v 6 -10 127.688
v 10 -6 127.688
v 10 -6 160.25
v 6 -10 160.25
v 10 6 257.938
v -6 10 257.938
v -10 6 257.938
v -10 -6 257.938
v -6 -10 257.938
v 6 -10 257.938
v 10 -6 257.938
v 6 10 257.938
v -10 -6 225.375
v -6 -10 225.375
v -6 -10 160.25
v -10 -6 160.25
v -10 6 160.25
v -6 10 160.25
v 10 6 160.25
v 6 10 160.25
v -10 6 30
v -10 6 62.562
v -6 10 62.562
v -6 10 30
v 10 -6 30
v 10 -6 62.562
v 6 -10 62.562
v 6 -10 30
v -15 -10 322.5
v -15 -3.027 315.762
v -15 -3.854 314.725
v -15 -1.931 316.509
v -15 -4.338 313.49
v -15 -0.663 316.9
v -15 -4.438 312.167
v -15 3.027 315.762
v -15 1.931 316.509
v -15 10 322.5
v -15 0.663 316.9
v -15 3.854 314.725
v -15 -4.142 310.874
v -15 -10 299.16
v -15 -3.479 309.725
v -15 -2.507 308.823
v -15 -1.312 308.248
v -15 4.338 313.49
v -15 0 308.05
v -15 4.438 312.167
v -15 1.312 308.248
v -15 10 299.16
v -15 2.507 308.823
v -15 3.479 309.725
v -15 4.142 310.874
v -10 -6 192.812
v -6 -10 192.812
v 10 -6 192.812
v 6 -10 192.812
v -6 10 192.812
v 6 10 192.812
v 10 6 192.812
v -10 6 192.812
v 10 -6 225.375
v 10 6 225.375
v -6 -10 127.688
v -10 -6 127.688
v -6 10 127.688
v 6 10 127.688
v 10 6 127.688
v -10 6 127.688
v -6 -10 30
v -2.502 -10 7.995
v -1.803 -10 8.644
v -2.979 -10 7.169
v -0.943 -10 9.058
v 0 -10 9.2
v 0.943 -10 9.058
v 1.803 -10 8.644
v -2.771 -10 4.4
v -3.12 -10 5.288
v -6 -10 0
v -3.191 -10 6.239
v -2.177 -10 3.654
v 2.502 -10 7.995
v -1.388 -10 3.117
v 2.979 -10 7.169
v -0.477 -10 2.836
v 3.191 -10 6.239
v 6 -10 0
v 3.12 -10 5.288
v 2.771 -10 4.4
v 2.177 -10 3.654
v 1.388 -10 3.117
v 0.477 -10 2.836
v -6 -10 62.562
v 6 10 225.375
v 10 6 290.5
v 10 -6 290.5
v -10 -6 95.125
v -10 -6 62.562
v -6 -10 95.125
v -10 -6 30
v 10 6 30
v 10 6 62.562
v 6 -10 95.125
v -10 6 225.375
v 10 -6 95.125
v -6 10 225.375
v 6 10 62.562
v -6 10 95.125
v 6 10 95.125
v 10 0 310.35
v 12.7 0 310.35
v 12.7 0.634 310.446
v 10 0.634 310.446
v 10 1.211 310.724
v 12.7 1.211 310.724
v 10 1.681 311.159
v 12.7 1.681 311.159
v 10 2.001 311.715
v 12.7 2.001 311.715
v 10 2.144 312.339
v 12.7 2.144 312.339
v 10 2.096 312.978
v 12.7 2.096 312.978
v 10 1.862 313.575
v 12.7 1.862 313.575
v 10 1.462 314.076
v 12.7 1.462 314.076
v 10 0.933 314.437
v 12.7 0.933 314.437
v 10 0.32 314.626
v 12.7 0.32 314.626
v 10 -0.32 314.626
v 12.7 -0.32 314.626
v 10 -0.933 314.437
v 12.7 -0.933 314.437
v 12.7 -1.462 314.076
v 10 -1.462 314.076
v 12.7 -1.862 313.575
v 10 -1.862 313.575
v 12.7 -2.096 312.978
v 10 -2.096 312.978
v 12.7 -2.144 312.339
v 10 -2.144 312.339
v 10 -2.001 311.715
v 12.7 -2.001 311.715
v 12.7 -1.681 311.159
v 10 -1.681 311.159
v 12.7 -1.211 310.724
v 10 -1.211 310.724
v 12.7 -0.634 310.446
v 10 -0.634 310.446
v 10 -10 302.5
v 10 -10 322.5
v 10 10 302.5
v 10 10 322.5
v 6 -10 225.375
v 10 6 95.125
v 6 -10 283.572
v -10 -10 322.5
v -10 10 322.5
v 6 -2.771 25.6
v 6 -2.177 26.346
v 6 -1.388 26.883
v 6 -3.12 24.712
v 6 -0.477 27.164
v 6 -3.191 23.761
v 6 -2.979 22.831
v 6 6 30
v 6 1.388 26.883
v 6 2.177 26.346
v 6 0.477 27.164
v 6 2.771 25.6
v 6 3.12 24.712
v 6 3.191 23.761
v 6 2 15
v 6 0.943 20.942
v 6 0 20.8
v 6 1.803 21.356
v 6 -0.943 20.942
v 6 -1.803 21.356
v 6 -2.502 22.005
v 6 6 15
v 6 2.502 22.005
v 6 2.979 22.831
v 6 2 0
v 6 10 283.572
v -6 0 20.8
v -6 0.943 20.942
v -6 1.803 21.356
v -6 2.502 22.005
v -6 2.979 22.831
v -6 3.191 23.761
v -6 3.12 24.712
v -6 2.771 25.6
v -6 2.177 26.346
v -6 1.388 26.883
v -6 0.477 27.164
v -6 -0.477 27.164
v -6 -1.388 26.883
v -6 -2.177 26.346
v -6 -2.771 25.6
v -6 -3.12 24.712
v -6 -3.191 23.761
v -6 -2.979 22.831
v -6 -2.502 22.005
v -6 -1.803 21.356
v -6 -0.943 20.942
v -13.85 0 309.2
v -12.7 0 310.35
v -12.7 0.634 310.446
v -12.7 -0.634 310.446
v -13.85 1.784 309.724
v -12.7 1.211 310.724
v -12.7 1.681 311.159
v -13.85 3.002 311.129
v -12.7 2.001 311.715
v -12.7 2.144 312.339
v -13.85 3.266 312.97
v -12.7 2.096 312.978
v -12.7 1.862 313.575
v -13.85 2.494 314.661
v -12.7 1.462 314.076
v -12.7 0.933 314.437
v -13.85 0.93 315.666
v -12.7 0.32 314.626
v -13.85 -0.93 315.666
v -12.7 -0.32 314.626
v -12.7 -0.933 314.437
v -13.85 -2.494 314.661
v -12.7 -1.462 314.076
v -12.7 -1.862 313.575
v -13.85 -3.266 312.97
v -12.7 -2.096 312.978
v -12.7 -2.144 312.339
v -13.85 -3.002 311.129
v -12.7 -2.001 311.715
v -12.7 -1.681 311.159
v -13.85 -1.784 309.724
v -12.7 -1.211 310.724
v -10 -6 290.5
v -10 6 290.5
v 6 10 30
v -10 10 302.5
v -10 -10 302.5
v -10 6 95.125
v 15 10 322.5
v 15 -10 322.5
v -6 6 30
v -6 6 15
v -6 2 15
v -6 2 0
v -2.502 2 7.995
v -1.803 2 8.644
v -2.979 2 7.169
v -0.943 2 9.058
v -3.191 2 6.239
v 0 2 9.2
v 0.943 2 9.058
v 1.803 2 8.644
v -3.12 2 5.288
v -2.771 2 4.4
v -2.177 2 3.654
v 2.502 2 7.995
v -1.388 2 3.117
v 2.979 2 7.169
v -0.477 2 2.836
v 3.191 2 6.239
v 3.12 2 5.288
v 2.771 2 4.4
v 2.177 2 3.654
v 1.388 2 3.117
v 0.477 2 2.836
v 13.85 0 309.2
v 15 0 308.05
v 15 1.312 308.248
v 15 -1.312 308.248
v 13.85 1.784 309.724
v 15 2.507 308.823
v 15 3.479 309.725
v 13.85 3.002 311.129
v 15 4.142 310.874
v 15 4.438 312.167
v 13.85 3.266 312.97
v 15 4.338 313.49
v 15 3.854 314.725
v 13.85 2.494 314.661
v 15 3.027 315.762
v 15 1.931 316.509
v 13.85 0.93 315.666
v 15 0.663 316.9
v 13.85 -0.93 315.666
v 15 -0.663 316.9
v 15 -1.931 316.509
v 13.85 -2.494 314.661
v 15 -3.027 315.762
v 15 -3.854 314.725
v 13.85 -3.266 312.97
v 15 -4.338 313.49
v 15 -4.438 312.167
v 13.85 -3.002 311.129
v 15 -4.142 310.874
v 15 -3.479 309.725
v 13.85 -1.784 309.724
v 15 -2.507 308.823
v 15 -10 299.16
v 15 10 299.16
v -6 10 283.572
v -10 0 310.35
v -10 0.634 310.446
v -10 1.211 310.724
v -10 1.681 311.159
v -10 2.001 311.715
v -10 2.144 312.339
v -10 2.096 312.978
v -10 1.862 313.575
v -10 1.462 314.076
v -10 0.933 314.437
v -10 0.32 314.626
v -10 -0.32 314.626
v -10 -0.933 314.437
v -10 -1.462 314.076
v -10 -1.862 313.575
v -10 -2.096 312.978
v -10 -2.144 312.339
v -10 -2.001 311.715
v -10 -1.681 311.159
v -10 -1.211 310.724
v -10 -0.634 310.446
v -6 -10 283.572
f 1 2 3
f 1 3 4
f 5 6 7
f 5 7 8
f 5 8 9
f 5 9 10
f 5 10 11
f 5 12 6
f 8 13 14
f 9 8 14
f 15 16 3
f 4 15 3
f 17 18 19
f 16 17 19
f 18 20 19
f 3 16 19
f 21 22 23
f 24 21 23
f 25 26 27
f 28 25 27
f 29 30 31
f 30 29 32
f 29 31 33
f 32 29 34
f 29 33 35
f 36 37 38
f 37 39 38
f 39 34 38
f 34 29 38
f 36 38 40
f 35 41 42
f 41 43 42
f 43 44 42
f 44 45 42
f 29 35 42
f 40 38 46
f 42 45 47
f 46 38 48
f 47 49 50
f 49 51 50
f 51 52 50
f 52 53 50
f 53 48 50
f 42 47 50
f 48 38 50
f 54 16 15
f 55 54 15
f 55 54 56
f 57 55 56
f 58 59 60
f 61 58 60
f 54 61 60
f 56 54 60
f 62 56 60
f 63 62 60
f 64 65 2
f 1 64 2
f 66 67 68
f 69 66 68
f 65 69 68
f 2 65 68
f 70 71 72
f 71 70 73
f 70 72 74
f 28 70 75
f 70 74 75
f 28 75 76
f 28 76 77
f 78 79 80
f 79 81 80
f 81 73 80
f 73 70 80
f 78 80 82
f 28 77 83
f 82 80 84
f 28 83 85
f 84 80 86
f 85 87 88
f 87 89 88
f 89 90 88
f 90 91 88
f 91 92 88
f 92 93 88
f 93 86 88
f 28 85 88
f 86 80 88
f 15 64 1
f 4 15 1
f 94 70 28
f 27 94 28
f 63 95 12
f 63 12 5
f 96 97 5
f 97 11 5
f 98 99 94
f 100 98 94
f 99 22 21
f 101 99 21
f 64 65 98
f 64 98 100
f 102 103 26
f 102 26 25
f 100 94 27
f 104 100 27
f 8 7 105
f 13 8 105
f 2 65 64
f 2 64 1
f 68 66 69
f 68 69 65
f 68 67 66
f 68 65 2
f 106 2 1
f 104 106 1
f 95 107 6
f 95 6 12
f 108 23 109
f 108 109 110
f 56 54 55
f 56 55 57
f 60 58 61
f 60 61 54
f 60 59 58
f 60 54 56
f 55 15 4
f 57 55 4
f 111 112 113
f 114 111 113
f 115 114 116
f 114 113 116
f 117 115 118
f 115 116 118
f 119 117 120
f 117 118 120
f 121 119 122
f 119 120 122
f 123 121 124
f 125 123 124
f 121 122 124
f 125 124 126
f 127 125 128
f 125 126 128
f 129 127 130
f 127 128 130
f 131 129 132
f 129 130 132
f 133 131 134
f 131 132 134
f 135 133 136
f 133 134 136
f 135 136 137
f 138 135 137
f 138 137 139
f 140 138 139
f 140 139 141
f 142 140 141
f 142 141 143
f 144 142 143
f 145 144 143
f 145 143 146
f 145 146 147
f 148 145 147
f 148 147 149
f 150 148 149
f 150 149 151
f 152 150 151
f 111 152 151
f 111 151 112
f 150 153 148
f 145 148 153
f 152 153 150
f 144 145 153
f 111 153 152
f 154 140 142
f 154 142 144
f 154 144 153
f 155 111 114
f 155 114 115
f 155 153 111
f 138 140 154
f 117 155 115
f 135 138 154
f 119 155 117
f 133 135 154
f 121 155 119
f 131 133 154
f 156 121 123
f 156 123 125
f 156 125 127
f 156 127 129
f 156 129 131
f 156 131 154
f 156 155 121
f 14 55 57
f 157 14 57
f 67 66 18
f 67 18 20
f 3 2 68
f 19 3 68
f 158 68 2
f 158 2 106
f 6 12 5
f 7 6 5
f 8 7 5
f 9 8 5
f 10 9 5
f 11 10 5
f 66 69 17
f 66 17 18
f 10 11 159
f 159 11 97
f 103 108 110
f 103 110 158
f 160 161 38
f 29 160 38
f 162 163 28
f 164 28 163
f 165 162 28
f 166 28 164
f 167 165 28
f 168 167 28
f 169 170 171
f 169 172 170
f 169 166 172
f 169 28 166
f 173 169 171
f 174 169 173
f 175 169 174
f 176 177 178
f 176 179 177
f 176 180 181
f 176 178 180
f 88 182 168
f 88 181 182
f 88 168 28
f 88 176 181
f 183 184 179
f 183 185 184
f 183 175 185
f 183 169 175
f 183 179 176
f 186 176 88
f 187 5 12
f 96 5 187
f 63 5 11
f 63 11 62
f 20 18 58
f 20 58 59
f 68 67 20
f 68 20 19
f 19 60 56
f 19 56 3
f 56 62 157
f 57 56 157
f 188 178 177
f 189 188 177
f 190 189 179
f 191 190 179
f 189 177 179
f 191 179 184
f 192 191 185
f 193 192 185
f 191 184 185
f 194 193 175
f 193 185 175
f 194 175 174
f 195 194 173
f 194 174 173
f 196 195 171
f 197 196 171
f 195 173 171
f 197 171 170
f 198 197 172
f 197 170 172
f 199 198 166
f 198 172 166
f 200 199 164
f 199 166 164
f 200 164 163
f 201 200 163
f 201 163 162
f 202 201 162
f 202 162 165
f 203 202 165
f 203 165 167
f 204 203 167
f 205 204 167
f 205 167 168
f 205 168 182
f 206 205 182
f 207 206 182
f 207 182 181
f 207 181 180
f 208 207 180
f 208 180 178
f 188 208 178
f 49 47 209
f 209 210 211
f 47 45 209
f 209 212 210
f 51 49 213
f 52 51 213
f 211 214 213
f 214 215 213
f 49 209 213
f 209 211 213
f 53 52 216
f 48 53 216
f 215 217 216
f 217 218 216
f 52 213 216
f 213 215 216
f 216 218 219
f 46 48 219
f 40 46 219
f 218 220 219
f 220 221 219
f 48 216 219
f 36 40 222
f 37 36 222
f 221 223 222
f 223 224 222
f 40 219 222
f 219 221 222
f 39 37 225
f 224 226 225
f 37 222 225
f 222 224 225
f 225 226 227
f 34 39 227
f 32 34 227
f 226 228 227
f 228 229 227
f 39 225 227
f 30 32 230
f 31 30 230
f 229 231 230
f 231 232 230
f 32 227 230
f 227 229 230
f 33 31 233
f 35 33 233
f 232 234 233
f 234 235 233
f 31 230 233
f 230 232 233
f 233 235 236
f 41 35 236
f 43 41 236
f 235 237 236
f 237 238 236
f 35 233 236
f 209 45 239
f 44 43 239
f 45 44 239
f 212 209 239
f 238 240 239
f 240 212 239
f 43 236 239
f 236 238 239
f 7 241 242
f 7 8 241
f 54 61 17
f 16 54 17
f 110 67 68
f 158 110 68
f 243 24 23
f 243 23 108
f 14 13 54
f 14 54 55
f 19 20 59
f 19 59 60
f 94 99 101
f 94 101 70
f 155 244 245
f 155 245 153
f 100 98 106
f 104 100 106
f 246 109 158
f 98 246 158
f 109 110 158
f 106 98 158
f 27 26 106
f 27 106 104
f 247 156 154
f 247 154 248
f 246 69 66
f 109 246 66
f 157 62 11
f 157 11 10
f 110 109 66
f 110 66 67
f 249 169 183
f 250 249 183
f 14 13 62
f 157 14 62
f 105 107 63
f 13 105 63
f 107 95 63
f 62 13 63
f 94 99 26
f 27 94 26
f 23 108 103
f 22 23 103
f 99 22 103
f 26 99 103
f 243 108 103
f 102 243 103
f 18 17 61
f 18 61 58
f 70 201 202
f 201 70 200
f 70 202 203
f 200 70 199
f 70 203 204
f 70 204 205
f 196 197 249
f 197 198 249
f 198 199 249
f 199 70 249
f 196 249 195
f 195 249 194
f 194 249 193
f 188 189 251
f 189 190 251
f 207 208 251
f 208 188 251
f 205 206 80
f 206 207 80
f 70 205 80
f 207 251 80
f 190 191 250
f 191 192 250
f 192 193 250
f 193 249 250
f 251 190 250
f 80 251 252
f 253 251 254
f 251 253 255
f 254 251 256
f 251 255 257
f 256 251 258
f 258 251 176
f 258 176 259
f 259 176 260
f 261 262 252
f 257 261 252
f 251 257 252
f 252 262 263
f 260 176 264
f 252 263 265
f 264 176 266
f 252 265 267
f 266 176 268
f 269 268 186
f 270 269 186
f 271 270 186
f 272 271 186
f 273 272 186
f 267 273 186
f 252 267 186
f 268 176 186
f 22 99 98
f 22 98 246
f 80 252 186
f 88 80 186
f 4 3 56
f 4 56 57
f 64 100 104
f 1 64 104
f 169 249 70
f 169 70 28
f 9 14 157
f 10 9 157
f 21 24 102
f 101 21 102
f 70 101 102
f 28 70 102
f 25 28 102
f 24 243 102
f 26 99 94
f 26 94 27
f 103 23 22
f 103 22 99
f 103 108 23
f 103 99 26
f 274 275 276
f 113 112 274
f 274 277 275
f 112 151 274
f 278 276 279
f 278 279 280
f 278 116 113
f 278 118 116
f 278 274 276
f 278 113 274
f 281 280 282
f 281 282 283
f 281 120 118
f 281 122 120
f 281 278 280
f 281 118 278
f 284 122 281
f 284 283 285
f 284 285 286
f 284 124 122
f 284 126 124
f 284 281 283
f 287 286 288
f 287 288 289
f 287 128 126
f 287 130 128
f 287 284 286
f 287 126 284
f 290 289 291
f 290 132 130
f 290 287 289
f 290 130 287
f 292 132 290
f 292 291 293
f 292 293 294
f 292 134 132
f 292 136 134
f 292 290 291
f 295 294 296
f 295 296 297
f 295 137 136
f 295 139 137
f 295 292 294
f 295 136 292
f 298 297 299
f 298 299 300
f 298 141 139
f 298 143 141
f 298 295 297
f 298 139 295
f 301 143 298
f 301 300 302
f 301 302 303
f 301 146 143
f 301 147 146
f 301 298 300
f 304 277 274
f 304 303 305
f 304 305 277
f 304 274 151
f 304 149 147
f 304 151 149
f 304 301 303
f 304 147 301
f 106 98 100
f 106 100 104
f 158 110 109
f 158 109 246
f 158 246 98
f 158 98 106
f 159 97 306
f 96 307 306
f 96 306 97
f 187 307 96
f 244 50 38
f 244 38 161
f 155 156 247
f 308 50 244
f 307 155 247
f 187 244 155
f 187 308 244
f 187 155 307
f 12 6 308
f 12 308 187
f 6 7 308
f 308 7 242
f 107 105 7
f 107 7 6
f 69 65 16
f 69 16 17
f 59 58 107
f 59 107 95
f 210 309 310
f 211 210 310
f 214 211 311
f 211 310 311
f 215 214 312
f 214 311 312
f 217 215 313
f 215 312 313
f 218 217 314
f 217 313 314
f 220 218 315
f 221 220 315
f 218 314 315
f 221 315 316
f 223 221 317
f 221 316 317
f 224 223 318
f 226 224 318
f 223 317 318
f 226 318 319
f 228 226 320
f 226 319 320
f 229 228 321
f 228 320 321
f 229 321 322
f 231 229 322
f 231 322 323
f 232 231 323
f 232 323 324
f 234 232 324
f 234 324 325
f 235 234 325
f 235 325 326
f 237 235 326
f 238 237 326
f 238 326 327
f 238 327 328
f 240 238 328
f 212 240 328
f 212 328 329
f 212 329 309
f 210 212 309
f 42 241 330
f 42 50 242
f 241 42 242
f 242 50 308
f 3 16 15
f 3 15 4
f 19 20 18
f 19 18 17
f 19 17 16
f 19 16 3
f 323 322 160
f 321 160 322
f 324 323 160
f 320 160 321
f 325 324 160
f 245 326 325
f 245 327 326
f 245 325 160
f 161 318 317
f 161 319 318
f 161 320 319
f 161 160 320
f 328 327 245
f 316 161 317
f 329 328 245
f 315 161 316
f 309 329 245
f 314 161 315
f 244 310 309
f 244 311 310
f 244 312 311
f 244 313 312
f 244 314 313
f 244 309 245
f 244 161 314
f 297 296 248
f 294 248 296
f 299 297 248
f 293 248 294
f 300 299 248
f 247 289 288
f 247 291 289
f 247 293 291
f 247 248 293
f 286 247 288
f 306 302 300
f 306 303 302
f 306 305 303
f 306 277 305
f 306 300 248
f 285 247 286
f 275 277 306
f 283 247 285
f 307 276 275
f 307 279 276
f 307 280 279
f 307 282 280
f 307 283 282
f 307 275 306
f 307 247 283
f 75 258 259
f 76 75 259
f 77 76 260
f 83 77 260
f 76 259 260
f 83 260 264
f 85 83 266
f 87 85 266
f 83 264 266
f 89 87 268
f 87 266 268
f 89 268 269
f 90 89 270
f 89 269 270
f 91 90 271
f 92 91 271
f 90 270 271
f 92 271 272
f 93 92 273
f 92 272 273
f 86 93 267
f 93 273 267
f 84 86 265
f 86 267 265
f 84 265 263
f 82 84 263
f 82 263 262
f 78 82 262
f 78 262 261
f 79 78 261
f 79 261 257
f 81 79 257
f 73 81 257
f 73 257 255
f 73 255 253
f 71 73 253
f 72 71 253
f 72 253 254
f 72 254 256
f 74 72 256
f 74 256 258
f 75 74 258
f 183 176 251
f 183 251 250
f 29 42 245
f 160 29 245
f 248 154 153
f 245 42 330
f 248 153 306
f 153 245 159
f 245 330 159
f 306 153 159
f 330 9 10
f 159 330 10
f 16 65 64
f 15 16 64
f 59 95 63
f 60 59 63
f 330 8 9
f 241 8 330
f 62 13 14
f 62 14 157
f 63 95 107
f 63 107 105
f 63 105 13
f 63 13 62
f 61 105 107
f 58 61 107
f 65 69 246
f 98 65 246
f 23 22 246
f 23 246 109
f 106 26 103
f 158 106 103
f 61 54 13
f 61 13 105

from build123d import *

# Parameters (mm, degrees)
SKETCH1_W             = 20
SKETCH1_H             = 20
BOSS_EXTRUDE1_DEPTH   = 302.5
BOSS_EXTRUDE2_DEPTH   = 20
SKETCH3_R             = 2.15
CUT_EXTRUDE1_DEPTH    = 325.046678736
SKETCH4_W             = 4
SKETCH4_H             = 30
CUT_EXTRUDE2_DEPTH    = 324.467540875
CHAMFER1_SIZE         = 2.3
SKETCH5_W             = 15
SKETCH5_H             = 8
CUT_EXTRUDE3_DEPTH    = 324.337671792
SKETCH6_R             = 3.2
CUT_EXTRUDE4_DEPTH    = 324.071586494
SKETCH7_R             = 3.2
CUT_EXTRUDE5_DEPTH    = 324.337671792
SKETCH10_W            = 20
SKETCH10_H            = 32.5625
CUT_EXTRUDE7_DEPTH    = 324.467540875
SKETCH11_W            = 20
SKETCH11_H            = 32.5625
BOSS_EXTRUDE3_DEPTH   = 20
BOSS_EXTRUDE3_2_DEPTH = 20
BOSS_EXTRUDE3_3_DEPTH = 20
BOSS_EXTRUDE3_4_DEPTH = 20
CHAMFER3_SIZE         = 4
CUT_EXTRUDE8_DEPTH    = 227.9375
SKETCH13_W            = 15
SKETCH13_H            = 4
CUT_EXTRUDE9_DEPTH    = 324.337671792


with BuildPart() as part:
    # Sketch1 → Boss-Extrude1 (new body)
    with BuildSketch(Plane.XY):
        Rectangle(SKETCH1_W, SKETCH1_H)
    extrude(amount=BOSS_EXTRUDE1_DEPTH)

    # Sketch2 → Boss-Extrude2 (add)
    with BuildSketch(Plane(origin=(0, 10, 0), x_dir=(1, 0, 0), z_dir=(0, 1, 0))):
        Polygon((10, -302.5), (10, -322.5), (15, -322.5), (15, -299.160254038), (10, -290.5), align=None)
        Polygon((-10, -290.5), (-10, -302.5), (-10, -322.5), (-15, -322.5), (-15, -299.160254038), align=None)
    extrude(amount=-BOSS_EXTRUDE2_DEPTH)

    # Sketch3 → Cut-Extrude1 (cut, through all)
    with BuildSketch(Plane(origin=(15, 0, 0), x_dir=(0, 0, -1), z_dir=(1, 0, 0))):
        with Locations((-312.5, 0)):
            Circle(SKETCH3_R)
    extrude(amount=-CUT_EXTRUDE1_DEPTH, mode=Mode.SUBTRACT)

    # Sketch4 → Cut-Extrude2 (cut, through all)
    with BuildSketch(Plane(origin=(0, 10, 0), x_dir=(1, 0, 0), z_dir=(0, 1, 0))):
        with Locations((-8, -15)):
            Rectangle(SKETCH4_W, SKETCH4_H)
        with Locations((8, -15)):
            Rectangle(SKETCH4_W, SKETCH4_H)
    extrude(amount=-CUT_EXTRUDE2_DEPTH, mode=Mode.SUBTRACT)

    # Chamfer1
    chamfer1_edges = [part.edges().sort_by_distance(p)[0] for p in [
        (-15, 0, 314.65),
        (15, 0, 314.65),
    ]]
    chamfer(chamfer1_edges, length=CHAMFER1_SIZE)

    # Sketch5 → Cut-Extrude3 (cut, through all)
    with BuildSketch(Plane(origin=(6, 0, 0), x_dir=(0, 0, -1), z_dir=(1, 0, 0))):
        with Locations((-7.5, 6)):
            Rectangle(SKETCH5_W, SKETCH5_H)
    extrude(amount=-CUT_EXTRUDE3_DEPTH, mode=Mode.SUBTRACT)

    # Sketch6 → Cut-Extrude4 (cut, through all)
    with BuildSketch(Plane(origin=(0, 2, 0), x_dir=(1, 0, 0), z_dir=(0, 1, 0))):
        with Locations(Location((0, -6, 0), (0, 0, 270))):
            Circle(SKETCH6_R)
    extrude(amount=-CUT_EXTRUDE4_DEPTH, mode=Mode.SUBTRACT)

    # Sketch7 → Cut-Extrude5 (cut, through all)
    with BuildSketch(Plane(origin=(6, 0, 0), x_dir=(0, 0, -1), z_dir=(1, 0, 0))):
        with Locations((-24, 0)):
            Circle(SKETCH7_R)
    extrude(amount=-CUT_EXTRUDE5_DEPTH, mode=Mode.SUBTRACT)

    # Sketch10 → Cut-Extrude7 (cut, through all)
    with BuildSketch(Plane(origin=(0, 10, 0), x_dir=(1, 0, 0), z_dir=(0, 1, 0))):
        with Locations((0, -46.28125)):
            Rectangle(SKETCH10_W, SKETCH10_H)
        with Locations((0, -111.40625)):
            Rectangle(SKETCH10_W, SKETCH10_H)
        with Locations((0, -176.53125)):
            Rectangle(SKETCH10_W, SKETCH10_H)
        with Locations((0, -241.65625)):
            Rectangle(SKETCH10_W, SKETCH10_H)
    extrude(amount=-CUT_EXTRUDE7_DEPTH, mode=Mode.SUBTRACT)


with BuildPart() as cut_extrude7_piece_1:
    # of the separate pieces the step leaves, piece 1, a body of its own (cut_extrude7_pieces)
    add(part.part.solids().sort_by_distance((15, 0, 308.05))[0])

    # Chamfer3
    chamfer3_edges = [cut_extrude7_piece_1.edges().sort_by_distance(p)[0] for p in [
        (10, 10, 274.21875),
        (-10, 10, 274.21875),
        (-10, -10, 274.21875),
        (10, -10, 274.21875),
    ]]
    chamfer(chamfer3_edges, length=CHAMFER3_SIZE)


with BuildPart() as cut_extrude7_piece_2:
    # of the separate pieces the step leaves, piece 2, a body of its own (cut_extrude7_pieces)
    add(part.part.solids().sort_by_distance((10, 10, 192.8125))[0])


with BuildPart() as cut_extrude7_piece_3:
    # of the separate pieces the step leaves, piece 3, a body of its own (cut_extrude7_pieces)
    add(part.part.solids().sort_by_distance((10, 10, 62.5625))[0])


with BuildPart() as cut_extrude7_piece_4:
    # of the separate pieces the step leaves, piece 4, a body of its own (cut_extrude7_pieces)
    add(part.part.solids().sort_by_distance((-10, 10, 127.6875))[0])


with BuildPart() as cut_extrude7_piece_5:
    # of the separate pieces the step leaves, piece 5, a body of its own (cut_extrude7_pieces)
    add(part.part.solids().sort_by_distance((6, 10, 15))[0])

    # Sketch13 → Cut-Extrude9 (cut, through all)
    with BuildSketch(Plane(origin=(6, 0, 0), x_dir=(0, 0, -1), z_dir=(1, 0, 0))):
        with Locations((-22.5, 8)):
            Rectangle(SKETCH13_W, SKETCH13_H)
    extrude(amount=-CUT_EXTRUDE9_DEPTH, mode=Mode.SUBTRACT)


with BuildPart() as body_6:
    # Sketch11 → Boss-Extrude3 (new body)
    with BuildSketch(Plane(origin=(0, 10, 0), x_dir=(1, 0, 0), z_dir=(0, 1, 0))):
        with Locations((0, -46.28125)):
            Rectangle(SKETCH11_W, SKETCH11_H)
    extrude(amount=-BOSS_EXTRUDE3_DEPTH)


with BuildPart() as body_7:
    # Sketch11 → Boss-Extrude3 2 (new body)
    with BuildSketch(Plane(origin=(0, 10, 0), x_dir=(1, 0, 0), z_dir=(0, 1, 0))):
        with Locations((0, -111.40625)):
            Rectangle(SKETCH11_W, SKETCH11_H)
    extrude(amount=-BOSS_EXTRUDE3_2_DEPTH)


with BuildPart() as body_8:
    # Sketch11 → Boss-Extrude3 3 (new body)
    with BuildSketch(Plane(origin=(0, 10, 0), x_dir=(1, 0, 0), z_dir=(0, 1, 0))):
        with Locations((0, -176.53125)):
            Rectangle(SKETCH11_W, SKETCH11_H)
    extrude(amount=-BOSS_EXTRUDE3_3_DEPTH)


with BuildPart() as body_9:
    # Sketch11 → Boss-Extrude3 4 (new body)
    with BuildSketch(Plane(origin=(0, 10, 0), x_dir=(1, 0, 0), z_dir=(0, 1, 0))):
        with Locations((0, -241.65625)):
            Rectangle(SKETCH11_W, SKETCH11_H)
    extrude(amount=-BOSS_EXTRUDE3_4_DEPTH)


with BuildPart() as cut_extrude8_tool:
    # Sketch12 → Cut-Extrude8 (new body)
    with BuildSketch(Plane(origin=(0, 0, 30), x_dir=(-1, 0, 0), z_dir=(0, 0, -1))):
        Polygon((-10, 10), (-6, 10), (-10, 6), align=None)
        Polygon((-10, -10), (-10, -6), (-6, -10), align=None)
        Polygon((6, 10), (10, 10), (10, 6), align=None)
        Polygon((10, -10), (10, -6), (6, -10), align=None)
    extrude(amount=-CUT_EXTRUDE8_DEPTH)


with BuildPart() as cut_extrude7_piece_2_1:
    add(cut_extrude7_piece_2.part)

    # Cut-Extrude8: cut by cut_extrude8_tool
    add(cut_extrude8_tool.part, mode=Mode.SUBTRACT)


with BuildPart() as cut_extrude7_piece_3_1:
    add(cut_extrude7_piece_3.part)

    # Cut-Extrude8: cut by cut_extrude8_tool
    add(cut_extrude8_tool.part, mode=Mode.SUBTRACT)


with BuildPart() as cut_extrude7_piece_4_1:
    add(cut_extrude7_piece_4.part)

    # Cut-Extrude8: cut by cut_extrude8_tool
    add(cut_extrude8_tool.part, mode=Mode.SUBTRACT)


with BuildPart() as body_6_1:
    add(body_6.part)

    # Cut-Extrude8: cut by cut_extrude8_tool
    add(cut_extrude8_tool.part, mode=Mode.SUBTRACT)


with BuildPart() as body_7_1:
    add(body_7.part)

    # Cut-Extrude8: cut by cut_extrude8_tool
    add(cut_extrude8_tool.part, mode=Mode.SUBTRACT)


with BuildPart() as body_8_1:
    add(body_8.part)

    # Cut-Extrude8: cut by cut_extrude8_tool
    add(cut_extrude8_tool.part, mode=Mode.SUBTRACT)


with BuildPart() as body_9_1:
    add(body_9.part)

    # Cut-Extrude8: cut by cut_extrude8_tool
    add(cut_extrude8_tool.part, mode=Mode.SUBTRACT)


solid = Compound([cut_extrude7_piece_1.part, cut_extrude7_piece_5.part, cut_extrude7_piece_2_1.part, cut_extrude7_piece_3_1.part, cut_extrude7_piece_4_1.part, body_6_1.part, body_7_1.part, body_8_1.part, body_9_1.part])
